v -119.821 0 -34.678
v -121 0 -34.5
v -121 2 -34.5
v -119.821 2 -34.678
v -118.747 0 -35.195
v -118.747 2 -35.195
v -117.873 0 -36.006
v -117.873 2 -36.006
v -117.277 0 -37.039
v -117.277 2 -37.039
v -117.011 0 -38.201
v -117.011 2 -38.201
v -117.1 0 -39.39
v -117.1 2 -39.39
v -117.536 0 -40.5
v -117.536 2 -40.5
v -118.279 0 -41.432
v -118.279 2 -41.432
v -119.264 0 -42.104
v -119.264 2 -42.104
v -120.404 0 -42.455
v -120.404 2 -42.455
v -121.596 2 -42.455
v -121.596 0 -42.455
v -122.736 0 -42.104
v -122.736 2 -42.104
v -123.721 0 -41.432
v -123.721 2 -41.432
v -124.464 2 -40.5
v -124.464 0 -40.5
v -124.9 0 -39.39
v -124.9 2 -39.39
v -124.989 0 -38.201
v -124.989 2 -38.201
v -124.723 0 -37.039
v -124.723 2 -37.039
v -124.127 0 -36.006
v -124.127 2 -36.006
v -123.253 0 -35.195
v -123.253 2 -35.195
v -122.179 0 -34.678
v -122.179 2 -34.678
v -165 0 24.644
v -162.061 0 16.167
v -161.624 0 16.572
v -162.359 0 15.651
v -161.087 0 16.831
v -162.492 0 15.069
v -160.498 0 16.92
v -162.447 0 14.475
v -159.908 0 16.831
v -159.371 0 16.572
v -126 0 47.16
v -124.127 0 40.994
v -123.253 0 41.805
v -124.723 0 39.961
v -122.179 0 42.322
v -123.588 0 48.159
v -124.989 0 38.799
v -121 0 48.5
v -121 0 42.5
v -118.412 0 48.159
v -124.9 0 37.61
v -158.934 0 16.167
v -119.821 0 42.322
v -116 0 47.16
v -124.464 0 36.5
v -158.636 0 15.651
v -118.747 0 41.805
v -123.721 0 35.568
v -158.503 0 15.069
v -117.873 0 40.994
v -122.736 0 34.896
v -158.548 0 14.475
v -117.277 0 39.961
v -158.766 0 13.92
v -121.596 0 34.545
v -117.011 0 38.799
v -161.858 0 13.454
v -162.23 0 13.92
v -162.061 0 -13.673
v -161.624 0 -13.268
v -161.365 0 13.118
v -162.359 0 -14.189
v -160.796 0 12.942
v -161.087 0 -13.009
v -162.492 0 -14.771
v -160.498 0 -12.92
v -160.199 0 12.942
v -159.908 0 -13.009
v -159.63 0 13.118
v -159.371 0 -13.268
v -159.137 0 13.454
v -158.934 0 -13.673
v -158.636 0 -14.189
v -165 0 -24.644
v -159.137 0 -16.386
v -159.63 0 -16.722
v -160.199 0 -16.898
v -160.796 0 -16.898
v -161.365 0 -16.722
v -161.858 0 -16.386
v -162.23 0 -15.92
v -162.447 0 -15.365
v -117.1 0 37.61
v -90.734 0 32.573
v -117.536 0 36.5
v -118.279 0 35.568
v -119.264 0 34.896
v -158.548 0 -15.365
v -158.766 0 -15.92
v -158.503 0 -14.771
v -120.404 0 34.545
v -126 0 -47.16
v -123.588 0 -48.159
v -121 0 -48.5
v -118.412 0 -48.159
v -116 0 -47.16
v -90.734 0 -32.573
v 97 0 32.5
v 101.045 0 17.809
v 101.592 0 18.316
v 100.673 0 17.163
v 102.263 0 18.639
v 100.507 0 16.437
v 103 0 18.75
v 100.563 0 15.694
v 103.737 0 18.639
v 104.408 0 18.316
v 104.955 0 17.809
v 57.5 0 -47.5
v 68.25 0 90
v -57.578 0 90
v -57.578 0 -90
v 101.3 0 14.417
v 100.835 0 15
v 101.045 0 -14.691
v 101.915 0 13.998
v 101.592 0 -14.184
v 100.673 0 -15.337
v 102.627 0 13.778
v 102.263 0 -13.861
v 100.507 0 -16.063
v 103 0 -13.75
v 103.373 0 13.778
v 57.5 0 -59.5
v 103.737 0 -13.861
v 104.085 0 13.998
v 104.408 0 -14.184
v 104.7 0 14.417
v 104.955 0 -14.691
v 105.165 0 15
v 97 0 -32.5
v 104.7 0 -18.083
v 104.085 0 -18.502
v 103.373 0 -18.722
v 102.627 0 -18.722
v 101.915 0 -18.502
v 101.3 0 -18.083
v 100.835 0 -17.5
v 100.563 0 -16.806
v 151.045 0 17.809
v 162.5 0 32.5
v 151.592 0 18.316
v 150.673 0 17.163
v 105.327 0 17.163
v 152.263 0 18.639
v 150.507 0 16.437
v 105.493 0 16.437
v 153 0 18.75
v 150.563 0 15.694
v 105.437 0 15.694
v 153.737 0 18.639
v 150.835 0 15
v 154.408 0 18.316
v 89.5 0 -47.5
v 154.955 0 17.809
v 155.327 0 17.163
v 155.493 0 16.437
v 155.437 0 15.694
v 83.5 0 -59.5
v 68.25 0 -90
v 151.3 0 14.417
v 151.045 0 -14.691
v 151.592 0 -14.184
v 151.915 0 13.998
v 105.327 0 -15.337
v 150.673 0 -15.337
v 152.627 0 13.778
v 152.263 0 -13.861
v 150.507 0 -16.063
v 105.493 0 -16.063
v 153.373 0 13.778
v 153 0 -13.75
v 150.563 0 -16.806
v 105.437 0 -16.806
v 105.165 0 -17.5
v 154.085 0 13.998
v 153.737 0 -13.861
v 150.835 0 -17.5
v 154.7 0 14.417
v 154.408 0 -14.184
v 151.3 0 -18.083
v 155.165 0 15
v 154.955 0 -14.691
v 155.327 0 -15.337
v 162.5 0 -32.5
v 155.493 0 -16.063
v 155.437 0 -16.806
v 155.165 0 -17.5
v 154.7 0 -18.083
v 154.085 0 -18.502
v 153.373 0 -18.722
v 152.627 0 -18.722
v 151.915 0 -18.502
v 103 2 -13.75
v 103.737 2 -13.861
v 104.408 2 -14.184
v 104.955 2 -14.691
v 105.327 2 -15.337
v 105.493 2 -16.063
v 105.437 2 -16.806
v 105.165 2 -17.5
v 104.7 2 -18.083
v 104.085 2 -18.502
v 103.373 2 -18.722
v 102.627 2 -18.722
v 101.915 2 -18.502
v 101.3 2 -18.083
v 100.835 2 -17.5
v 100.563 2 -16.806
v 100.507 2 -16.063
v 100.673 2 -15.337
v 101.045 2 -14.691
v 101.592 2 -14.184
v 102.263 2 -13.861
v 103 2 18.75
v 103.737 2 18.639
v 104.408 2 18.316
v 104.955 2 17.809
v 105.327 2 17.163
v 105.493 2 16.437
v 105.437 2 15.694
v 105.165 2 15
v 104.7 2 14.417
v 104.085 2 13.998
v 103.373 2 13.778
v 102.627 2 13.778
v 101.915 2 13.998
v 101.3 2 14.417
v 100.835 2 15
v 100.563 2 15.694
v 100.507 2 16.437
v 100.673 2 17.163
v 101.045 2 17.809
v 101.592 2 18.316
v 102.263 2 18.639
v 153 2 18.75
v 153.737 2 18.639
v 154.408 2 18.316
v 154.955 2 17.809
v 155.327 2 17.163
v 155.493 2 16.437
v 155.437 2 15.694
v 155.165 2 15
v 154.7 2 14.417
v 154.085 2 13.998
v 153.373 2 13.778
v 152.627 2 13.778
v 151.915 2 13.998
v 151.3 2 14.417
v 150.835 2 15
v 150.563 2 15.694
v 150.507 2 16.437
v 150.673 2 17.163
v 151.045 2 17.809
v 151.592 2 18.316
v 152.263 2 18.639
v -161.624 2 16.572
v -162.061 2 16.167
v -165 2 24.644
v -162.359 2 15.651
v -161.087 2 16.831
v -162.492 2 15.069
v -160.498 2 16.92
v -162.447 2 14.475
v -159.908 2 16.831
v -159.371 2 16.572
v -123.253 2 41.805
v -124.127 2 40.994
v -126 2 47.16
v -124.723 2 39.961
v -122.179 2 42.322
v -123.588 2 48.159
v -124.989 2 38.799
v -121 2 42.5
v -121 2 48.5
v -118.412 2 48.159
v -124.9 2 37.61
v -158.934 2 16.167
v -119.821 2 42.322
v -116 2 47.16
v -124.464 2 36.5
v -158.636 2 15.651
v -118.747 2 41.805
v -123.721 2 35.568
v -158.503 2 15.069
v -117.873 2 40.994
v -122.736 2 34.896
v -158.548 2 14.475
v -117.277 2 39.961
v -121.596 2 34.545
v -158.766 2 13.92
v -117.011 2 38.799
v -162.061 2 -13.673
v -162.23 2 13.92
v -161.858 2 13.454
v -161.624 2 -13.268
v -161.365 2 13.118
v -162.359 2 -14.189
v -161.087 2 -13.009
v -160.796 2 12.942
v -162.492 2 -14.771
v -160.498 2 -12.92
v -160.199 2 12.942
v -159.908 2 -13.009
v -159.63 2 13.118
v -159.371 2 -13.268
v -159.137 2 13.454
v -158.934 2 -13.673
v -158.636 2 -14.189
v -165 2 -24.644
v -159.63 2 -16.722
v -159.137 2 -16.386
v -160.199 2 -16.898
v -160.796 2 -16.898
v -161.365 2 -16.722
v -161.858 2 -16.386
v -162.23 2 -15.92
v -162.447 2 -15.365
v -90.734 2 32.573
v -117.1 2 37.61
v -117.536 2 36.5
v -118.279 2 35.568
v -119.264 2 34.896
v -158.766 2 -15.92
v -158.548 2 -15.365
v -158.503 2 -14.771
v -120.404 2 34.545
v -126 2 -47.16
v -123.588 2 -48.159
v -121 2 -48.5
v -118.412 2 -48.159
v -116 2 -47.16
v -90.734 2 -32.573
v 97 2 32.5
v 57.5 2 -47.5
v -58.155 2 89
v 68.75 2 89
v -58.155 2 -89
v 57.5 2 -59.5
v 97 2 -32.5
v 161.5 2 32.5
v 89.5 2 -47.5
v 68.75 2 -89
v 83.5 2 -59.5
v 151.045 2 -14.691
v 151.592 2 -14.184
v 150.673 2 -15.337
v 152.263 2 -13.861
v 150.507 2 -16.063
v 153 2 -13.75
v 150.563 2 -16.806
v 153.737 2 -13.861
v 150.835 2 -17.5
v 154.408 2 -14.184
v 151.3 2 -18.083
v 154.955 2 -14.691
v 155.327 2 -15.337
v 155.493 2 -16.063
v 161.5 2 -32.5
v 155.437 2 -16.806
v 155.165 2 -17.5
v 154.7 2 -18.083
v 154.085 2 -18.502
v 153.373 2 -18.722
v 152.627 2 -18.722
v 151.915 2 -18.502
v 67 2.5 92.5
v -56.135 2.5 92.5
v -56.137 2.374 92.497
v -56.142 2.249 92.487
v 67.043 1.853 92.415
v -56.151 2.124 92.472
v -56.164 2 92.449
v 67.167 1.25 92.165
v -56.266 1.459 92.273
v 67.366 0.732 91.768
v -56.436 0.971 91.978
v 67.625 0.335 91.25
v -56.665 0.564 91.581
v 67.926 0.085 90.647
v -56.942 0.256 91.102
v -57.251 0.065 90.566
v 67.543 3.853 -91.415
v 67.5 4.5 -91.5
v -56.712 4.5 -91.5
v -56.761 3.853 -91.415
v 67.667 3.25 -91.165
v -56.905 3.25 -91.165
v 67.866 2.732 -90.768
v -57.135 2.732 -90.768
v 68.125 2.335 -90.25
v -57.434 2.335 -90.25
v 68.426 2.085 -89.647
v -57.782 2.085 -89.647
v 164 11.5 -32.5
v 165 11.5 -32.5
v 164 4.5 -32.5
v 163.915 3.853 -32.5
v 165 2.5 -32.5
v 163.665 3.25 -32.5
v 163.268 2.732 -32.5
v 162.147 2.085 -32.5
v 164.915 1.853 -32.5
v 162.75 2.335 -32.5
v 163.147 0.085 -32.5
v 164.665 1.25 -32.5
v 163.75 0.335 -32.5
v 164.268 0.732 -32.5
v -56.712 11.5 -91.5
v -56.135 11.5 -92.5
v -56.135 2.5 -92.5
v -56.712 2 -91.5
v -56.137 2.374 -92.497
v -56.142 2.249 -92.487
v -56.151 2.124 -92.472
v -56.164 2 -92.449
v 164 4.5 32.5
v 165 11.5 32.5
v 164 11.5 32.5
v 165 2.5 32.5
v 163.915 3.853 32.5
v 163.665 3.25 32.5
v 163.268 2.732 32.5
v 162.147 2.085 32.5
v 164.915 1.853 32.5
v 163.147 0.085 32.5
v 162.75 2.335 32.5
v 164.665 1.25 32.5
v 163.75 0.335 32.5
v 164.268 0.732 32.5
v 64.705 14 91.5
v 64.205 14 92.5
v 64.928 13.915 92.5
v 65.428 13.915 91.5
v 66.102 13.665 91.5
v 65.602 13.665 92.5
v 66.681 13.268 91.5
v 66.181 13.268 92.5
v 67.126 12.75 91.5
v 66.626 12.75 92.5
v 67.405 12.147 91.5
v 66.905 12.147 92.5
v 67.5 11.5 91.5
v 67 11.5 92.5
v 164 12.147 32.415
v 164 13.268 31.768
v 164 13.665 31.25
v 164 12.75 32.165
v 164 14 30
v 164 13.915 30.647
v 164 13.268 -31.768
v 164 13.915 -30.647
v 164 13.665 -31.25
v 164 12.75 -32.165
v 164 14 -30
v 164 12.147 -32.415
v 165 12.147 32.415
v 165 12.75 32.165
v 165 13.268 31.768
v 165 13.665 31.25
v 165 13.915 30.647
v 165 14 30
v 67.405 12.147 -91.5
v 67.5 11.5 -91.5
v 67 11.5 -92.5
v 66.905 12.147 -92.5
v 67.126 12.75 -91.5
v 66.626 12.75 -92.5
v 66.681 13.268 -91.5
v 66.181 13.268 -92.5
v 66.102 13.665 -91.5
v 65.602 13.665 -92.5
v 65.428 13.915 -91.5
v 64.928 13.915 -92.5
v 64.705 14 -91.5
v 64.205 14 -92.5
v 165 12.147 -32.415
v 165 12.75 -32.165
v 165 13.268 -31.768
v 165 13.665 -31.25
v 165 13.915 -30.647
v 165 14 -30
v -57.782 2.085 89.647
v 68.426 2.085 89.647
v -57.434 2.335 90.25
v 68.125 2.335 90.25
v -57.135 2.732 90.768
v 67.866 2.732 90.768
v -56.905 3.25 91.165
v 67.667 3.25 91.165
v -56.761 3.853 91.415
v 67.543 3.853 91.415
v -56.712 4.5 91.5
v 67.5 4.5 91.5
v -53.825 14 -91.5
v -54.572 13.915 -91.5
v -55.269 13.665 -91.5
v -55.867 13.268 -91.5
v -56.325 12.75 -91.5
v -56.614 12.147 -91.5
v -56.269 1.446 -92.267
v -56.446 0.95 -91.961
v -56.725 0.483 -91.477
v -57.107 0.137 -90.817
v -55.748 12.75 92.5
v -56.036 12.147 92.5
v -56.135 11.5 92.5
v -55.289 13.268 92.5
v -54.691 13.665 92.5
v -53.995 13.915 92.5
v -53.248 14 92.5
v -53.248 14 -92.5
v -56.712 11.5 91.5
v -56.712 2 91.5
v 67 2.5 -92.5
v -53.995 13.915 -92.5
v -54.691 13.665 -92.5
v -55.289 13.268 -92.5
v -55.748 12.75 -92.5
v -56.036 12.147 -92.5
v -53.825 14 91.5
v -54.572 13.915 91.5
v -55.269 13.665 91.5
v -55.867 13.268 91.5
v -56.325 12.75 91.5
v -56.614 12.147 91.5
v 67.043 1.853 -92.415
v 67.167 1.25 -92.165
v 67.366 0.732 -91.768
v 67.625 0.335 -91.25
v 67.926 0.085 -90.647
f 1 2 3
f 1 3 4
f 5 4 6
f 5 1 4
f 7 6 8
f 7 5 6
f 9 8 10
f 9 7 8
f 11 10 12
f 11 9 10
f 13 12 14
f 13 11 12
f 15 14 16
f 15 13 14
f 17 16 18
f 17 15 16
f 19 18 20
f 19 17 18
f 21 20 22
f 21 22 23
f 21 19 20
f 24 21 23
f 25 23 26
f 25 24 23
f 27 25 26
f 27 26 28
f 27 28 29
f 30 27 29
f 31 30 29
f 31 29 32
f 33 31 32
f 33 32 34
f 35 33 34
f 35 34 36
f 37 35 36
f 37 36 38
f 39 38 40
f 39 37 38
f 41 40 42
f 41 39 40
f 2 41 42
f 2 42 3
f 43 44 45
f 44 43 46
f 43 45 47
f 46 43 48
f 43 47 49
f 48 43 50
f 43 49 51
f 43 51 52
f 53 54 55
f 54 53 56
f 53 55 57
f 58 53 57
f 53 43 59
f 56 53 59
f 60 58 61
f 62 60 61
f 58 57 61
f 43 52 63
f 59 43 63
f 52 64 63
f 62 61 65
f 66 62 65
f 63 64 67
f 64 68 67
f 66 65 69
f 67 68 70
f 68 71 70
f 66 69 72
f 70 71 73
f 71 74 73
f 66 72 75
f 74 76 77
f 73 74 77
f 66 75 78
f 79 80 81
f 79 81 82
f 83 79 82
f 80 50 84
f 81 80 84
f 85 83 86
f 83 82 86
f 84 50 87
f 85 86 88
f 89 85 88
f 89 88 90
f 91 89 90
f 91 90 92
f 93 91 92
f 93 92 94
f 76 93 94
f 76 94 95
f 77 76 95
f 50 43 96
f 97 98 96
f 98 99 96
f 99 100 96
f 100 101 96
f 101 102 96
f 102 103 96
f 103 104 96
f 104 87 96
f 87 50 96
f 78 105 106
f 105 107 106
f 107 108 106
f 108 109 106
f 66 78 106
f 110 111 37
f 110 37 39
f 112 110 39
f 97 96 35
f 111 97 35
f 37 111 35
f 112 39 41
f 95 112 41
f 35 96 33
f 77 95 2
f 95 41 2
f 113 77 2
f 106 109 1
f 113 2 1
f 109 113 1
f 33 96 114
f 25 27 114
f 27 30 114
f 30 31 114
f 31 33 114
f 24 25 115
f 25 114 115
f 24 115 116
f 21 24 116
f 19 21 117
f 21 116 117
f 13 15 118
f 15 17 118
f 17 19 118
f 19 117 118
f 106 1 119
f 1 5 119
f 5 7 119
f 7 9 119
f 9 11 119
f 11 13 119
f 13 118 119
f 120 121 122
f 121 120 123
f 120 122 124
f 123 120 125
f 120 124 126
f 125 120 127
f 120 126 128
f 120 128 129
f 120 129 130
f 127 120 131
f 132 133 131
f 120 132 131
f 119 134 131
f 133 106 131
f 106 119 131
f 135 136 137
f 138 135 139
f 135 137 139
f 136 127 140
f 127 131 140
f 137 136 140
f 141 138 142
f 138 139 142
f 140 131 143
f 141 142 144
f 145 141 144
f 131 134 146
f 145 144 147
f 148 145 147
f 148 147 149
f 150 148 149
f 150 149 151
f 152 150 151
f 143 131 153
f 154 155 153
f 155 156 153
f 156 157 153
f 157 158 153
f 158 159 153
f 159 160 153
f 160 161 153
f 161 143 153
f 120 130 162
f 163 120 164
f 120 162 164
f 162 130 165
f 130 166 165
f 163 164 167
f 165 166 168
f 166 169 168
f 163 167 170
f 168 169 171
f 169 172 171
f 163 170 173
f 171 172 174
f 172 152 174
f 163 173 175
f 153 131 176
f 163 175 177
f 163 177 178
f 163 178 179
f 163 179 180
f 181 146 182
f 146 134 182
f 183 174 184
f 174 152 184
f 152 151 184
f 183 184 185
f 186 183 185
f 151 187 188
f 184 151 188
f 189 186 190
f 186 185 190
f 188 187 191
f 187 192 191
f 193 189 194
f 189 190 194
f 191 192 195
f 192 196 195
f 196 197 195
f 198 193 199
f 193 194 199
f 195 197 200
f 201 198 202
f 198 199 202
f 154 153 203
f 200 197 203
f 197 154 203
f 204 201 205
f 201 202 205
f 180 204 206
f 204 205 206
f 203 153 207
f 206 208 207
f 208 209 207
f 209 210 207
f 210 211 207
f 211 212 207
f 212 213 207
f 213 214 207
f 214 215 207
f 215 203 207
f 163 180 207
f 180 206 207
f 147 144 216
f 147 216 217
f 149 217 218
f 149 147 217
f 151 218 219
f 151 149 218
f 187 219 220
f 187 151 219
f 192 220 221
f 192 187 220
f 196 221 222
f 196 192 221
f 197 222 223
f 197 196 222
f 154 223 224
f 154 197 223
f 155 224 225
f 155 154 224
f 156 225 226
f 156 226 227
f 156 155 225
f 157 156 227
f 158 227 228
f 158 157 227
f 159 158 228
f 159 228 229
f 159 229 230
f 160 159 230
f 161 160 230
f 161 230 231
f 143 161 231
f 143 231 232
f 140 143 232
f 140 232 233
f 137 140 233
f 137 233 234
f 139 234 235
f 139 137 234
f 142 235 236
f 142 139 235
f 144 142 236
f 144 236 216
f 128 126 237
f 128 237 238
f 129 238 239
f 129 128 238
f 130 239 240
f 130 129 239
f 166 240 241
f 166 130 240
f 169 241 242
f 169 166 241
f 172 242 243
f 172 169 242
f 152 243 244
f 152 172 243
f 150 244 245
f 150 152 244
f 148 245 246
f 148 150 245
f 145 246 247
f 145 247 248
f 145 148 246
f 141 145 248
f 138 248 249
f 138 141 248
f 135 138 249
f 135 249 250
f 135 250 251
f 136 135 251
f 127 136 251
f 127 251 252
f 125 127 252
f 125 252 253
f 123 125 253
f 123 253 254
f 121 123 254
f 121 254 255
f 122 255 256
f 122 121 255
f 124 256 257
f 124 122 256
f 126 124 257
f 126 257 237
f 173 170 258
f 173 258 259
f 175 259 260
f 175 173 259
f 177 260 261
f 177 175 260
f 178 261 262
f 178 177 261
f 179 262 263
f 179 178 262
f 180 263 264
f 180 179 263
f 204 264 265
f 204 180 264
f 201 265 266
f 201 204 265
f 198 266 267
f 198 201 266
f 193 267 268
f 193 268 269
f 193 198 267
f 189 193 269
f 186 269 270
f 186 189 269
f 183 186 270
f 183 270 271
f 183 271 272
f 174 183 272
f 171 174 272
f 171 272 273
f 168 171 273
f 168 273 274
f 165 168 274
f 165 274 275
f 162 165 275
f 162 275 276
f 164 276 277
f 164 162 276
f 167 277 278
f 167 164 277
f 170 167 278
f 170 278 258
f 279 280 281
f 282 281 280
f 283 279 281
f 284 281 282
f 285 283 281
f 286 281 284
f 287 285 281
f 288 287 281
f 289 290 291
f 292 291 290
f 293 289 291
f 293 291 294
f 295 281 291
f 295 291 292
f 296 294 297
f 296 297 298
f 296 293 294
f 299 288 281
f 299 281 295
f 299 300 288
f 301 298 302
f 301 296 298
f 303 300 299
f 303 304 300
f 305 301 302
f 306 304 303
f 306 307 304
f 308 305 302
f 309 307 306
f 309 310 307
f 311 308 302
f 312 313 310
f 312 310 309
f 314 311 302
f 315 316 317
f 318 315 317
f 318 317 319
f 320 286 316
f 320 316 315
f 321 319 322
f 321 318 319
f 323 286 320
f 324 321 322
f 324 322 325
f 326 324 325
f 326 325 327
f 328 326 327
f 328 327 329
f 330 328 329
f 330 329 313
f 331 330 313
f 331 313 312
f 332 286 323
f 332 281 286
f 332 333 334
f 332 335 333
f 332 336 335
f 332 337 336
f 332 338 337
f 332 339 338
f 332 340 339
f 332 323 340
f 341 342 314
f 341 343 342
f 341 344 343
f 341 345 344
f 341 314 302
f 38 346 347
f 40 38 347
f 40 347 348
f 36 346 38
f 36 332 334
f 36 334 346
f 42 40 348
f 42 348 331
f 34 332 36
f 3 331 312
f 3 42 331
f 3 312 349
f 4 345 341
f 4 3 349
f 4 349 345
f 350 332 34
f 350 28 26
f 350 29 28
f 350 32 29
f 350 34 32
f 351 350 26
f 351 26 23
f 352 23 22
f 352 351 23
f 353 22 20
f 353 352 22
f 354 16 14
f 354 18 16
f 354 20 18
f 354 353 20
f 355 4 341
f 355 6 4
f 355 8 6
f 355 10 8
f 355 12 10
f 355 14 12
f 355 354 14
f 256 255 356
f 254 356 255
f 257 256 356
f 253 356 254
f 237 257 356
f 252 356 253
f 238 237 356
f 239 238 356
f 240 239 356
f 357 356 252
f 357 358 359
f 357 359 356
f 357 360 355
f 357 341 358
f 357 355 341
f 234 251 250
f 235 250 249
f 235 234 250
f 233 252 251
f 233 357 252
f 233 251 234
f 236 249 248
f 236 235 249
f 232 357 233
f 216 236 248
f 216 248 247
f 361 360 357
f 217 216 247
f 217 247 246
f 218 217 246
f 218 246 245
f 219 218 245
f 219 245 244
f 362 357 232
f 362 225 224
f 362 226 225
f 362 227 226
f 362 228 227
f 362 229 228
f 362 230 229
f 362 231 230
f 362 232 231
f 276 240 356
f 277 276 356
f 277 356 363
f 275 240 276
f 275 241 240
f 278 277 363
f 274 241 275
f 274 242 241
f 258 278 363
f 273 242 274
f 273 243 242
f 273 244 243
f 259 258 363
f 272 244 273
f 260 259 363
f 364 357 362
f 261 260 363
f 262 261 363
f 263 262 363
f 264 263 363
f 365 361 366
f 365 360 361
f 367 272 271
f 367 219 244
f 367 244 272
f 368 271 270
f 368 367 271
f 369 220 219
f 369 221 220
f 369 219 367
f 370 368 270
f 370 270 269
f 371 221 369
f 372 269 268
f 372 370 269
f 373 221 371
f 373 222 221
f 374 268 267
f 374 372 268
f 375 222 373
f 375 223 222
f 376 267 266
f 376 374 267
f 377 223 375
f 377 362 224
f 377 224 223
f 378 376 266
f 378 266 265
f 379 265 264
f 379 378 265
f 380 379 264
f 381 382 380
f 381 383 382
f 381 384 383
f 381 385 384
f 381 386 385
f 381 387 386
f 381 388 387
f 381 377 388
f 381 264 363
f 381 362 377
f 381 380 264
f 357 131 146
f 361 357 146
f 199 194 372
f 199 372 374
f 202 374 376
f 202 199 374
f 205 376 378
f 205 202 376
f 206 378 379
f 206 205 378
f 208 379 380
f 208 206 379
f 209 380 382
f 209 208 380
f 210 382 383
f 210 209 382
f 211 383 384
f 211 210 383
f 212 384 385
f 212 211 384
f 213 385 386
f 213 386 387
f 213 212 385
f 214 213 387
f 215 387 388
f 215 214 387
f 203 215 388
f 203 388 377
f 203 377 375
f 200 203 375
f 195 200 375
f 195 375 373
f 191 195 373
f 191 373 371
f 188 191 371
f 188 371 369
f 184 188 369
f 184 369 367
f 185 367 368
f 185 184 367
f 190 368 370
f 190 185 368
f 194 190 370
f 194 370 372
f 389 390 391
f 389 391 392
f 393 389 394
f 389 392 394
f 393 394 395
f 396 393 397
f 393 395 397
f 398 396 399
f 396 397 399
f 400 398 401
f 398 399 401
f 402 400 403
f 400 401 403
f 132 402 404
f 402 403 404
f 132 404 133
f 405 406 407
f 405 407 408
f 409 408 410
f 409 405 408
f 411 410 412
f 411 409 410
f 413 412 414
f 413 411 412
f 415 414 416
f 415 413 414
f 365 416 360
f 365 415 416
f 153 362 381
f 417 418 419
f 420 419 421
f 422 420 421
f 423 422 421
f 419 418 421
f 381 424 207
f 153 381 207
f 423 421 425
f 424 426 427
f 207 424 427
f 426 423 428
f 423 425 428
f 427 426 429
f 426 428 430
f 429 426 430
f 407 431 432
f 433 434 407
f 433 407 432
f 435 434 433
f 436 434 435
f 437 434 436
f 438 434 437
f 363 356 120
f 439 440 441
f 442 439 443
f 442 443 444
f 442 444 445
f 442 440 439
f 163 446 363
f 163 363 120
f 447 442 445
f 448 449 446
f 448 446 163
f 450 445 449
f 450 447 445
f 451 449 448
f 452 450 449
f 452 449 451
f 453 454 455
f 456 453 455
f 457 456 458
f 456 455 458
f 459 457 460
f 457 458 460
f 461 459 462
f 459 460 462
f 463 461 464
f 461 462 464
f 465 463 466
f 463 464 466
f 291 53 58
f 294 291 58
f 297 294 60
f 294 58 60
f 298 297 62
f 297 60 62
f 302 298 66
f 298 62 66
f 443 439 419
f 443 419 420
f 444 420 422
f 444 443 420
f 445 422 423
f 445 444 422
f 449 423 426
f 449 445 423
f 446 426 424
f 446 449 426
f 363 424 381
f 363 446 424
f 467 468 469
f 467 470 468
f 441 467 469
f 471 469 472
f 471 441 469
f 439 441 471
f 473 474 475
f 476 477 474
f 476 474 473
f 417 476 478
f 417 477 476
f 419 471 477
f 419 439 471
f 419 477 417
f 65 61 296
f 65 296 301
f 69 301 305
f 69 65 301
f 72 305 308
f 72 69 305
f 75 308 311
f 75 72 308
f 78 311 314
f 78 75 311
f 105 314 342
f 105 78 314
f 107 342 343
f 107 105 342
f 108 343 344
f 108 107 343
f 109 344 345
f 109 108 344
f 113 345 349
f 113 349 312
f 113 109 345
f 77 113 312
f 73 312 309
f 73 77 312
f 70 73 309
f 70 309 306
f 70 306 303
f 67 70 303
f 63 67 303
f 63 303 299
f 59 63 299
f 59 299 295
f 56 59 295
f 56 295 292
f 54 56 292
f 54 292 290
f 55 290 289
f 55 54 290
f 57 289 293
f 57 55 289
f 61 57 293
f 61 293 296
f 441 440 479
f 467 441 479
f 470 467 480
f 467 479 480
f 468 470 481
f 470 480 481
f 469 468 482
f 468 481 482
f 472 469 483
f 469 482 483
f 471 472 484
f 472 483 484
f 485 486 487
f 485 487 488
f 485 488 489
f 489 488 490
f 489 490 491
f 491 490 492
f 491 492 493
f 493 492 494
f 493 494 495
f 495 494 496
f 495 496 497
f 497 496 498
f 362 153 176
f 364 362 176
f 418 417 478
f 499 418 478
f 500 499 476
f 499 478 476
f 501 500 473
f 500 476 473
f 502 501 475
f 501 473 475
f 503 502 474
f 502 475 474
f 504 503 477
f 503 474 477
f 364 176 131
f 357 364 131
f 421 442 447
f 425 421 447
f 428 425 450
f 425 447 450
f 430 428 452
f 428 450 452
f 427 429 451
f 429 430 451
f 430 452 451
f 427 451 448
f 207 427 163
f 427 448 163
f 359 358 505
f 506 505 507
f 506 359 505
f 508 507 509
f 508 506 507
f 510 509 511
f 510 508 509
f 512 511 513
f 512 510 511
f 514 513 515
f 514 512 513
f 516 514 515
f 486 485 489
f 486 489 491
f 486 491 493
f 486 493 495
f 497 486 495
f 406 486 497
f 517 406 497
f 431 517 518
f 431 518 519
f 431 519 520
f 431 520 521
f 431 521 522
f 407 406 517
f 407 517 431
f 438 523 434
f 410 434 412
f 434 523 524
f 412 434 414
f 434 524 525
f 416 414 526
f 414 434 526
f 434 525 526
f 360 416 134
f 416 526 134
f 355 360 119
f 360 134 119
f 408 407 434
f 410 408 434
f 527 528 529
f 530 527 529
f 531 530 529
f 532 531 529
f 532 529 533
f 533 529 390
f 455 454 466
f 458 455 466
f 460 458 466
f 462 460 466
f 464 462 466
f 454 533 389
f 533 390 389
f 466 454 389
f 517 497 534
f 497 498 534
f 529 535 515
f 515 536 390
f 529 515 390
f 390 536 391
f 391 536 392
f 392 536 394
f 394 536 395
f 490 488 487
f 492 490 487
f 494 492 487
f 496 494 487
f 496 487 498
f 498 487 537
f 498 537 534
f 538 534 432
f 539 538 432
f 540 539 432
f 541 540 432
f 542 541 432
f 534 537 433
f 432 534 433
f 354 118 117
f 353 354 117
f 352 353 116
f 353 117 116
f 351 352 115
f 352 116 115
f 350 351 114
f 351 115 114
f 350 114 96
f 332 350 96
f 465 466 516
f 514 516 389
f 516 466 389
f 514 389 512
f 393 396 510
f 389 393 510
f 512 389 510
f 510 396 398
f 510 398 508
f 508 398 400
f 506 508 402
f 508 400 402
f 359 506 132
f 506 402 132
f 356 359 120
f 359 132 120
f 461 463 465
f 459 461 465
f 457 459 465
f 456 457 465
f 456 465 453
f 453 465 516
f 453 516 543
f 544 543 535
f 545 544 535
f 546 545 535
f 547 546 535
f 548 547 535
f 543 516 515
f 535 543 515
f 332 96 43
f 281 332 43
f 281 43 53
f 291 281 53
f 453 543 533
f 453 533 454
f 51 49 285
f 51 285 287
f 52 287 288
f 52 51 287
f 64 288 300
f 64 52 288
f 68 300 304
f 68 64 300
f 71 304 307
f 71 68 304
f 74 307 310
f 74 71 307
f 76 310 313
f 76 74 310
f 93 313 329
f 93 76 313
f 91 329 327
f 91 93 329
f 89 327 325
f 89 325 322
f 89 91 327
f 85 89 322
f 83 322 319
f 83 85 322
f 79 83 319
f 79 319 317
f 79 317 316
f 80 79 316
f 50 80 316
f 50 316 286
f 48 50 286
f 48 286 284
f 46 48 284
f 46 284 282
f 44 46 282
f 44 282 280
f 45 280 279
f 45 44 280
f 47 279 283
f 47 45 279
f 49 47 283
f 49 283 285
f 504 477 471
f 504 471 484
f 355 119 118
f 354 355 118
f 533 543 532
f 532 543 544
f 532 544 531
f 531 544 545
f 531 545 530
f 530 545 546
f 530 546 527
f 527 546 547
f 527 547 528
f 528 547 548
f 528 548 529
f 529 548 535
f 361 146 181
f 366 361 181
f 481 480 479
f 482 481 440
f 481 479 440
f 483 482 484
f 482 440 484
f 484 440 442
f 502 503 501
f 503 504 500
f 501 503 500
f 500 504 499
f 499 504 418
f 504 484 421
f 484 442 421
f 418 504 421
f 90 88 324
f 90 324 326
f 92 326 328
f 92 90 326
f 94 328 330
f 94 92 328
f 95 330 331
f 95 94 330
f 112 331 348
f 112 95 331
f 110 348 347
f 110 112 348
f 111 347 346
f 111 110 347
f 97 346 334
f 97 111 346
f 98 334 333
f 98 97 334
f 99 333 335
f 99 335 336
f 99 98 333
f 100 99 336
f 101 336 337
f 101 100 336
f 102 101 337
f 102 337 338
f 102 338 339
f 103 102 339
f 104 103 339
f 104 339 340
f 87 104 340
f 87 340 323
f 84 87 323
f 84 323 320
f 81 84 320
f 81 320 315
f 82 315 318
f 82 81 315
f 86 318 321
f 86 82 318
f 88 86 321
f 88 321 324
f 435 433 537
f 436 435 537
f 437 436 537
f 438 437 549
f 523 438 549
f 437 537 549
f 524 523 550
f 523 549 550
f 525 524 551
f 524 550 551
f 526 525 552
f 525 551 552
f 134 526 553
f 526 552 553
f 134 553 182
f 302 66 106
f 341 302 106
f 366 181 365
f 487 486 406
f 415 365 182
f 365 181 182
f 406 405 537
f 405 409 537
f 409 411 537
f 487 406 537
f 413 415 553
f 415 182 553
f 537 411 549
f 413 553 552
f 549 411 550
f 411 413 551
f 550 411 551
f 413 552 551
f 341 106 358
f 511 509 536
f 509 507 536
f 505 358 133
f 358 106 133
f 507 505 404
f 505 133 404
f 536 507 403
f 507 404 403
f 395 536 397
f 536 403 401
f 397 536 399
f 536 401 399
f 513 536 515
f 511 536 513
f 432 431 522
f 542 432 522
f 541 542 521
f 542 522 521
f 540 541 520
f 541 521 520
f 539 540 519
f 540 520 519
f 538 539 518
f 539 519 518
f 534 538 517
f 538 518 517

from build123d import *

# Parameters (mm, degrees)
SKETCH1_R           = 4
SKETCH1_R_2         = 2
SKETCH1_R_3         = 2.5
BOSS_EXTRUDE1_DEPTH = 2
SKETCH2_W           = 1
SKETCH2_H           = 65
BOSS_EXTRUDE2_DEPTH = 12
FILLET1_R           = 2.5


with BuildPart() as part:
    # Sketch1 → Boss-Extrude1 (new body)
    with BuildSketch(Plane(origin=(0, 0, 0), x_dir=(1, 0, 0), z_dir=(0, 1, 0))):
        with BuildLine():
            Line((165, -32.5), (165, 32.5))
            Line((165, 32.5), (97, 32.5))
            Line((97, 32.5), (89.5, 47.5))
            Line((89.5, 47.5), (57.5, 47.5))
            Line((57.5, 47.5), (57.5, 59.5))
            Line((57.5, 59.5), (83.5, 59.5))
            Line((83.5, 59.5), (67, 92.5))
            Line((67, 92.5), (-56.134697257, 92.5))
            Line((-56.134697257, 92.5), (-90.733708845, 32.572754038))
            Line((-90.733708845, 32.572754038), (-116, 47.160254038))
            ThreePointArc((-116, 47.160254038), (-121, 48.5), (-126, 47.160254038))
            Line((-126, 47.160254038), (-165, 24.643593539))
            Line((-165, 24.643593539), (-165, -24.643593539))
            Line((-165, -24.643593539), (-126, -47.160254038))
            ThreePointArc((-126, -47.160254038), (-121, -48.5), (-116, -47.160254038))
            Line((-116, -47.160254038), (-90.733708845, -32.572754038))
            Line((-90.733708845, -32.572754038), (-56.134697257, -92.5))
            Line((-56.134697257, -92.5), (67, -92.5))
            Line((67, -92.5), (97, -32.5))
            Line((97, -32.5), (165, -32.5))
        make_face()
        with Locations(Location((-121, -38.5, 0), (0, 0, 270))):
            Circle(SKETCH1_R, mode=Mode.SUBTRACT)
        with Locations(Location((-160.497563939, -14.92, 0), (0, 0, 270))):
            Circle(SKETCH1_R_2, mode=Mode.SUBTRACT)
        with Locations(Location((103, -16.25, 0), (0, 0, 270))):
            Circle(SKETCH1_R_3, mode=Mode.SUBTRACT)
        with Locations(Location((153, -16.25, 0), (0, 0, 270))):
            Circle(SKETCH1_R_3, mode=Mode.SUBTRACT)
        with Locations(Location((-160.497578586, 14.92, 0), (0, 0, 270))):
            Circle(SKETCH1_R_2, mode=Mode.SUBTRACT)
        with Locations(Location((-121, 38.5, 0), (0, 0, 270))):
            Circle(SKETCH1_R, mode=Mode.SUBTRACT)
        with Locations(Location((103, 16.25, 0), (0, 0, 270))):
            Circle(SKETCH1_R_3, mode=Mode.SUBTRACT)
        with Locations(Location((153, 16.25, 0), (0, 0, 270))):
            Circle(SKETCH1_R_3, mode=Mode.SUBTRACT)
    extrude(amount=BOSS_EXTRUDE1_DEPTH)

    # Sketch2 → Boss-Extrude2 (add)
    with BuildSketch(Plane(origin=(0, 2, 0), x_dir=(1, 0, 0), z_dir=(0, 1, 0))):
        Polygon((-56.134697257, -92.5), (67, -92.5), (67.5, -91.5), (-56.712047526, -91.5), align=None)
        Polygon((-56.134697257, 92.5), (67, 92.5), (67.5, 91.5), (-56.712047526, 91.5), align=None)
        with Locations((164.5, 0)):
            Rectangle(SKETCH2_W, SKETCH2_H)
    extrude(amount=BOSS_EXTRUDE2_DEPTH)

    # Fillet1
    # the kernel refuses this fillet: 2.5 mm, written as the material it adds along each edge
    with BuildSketch(Plane(origin=(73.75, 2, -91.5), x_dir=(0, 1, 0), z_dir=(-1, 0, 0))) as fillet1_piece_1_section:
        with BuildLine():
            CenterArc((FILLET1_R, -FILLET1_R), FILLET1_R, 90, 90)
            Line((0, -FILLET1_R), (0, 0))
            Line((0, 0), (FILLET1_R, 0))
        make_face()
    fillet1_piece_1 = extrude(amount=136.712047526, mode=Mode.PRIVATE)
    fillet1_piece_1 = split(fillet1_piece_1, bisect_by=Plane(origin=(-41.43720377, 2.56450665, -117.956805463), z_dir=(0.8660254037844399, 0, 0.49999999999999795)), keep=Keep.TOP, mode=Mode.PRIVATE)
    fillet1_piece_1 = split(fillet1_piece_1, bisect_by=Plane(origin=(55.3017959, 2.56450665, -115.8964082), z_dir=(-0.894427190999916, 0, 0.447213595499958)), keep=Keep.TOP, mode=Mode.PRIVATE)
    add(fillet1_piece_1)
    with BuildSketch(Plane(origin=(164, 2, 32.5), x_dir=(0, 1, 0), z_dir=(0, 0, -1))) as fillet1_piece_2:
        with BuildLine():
            CenterArc((FILLET1_R, -FILLET1_R), FILLET1_R, 90, 90)
            Line((0, -FILLET1_R), (0, 0))
            Line((0, 0), (FILLET1_R, 0))
        make_face()
    extrude(amount=65)
    with BuildSketch(Plane(origin=(73.75, 2, 91.5), x_dir=(0, 0, -1), z_dir=(-1, 0, 0))) as fillet1_piece_3_section:
        with BuildLine():
            CenterArc((FILLET1_R, -FILLET1_R), FILLET1_R, 90, 90)
            Line((0, -FILLET1_R), (0, 0))
            Line((0, 0), (FILLET1_R, 0))
        make_face()
    fillet1_piece_3 = extrude(amount=136.712047526, mode=Mode.PRIVATE)
    fillet1_piece_3 = split(fillet1_piece_3, bisect_by=Plane(origin=(55.3017959, 2.56450665, 115.8964082), z_dir=(-0.894427190999916, 0, -0.44721359549995787)), keep=Keep.TOP, mode=Mode.PRIVATE)
    fillet1_piece_3 = split(fillet1_piece_3, bisect_by=Plane(origin=(-41.43720377, 2.56450665, 117.956805463), z_dir=(0.8660254037844399, 0, -0.49999999999999795)), keep=Keep.TOP, mode=Mode.PRIVATE)
    add(fillet1_piece_3)
    # the kernel refuses this fillet: 2.5 mm, written as the material it takes off along each edge
    with BuildSketch(Plane(origin=(-59.837047526, 14, -86.087341226), x_dir=(0, -1, 0), z_dir=(0.5000000000000019, 0, -0.8660254037844376)), Plane(origin=(-59.837047526, 14, 86.087341226), x_dir=(0.8660254037844394, 0, -0.49999999999999867), z_dir=(0.4999999999999987, 0, 0.8660254037844395))) as fillet1_2_piece_1:
        with BuildLine():
            CenterArc((FILLET1_R, -FILLET1_R), FILLET1_R, 90, 90)
            Line((0, -FILLET1_R), (0, 0))
            Line((0, 0), (FILLET1_R, 0))
        make_face()
    extrude(amount=13.654700538, mode=Mode.SUBTRACT)
    with BuildSketch(Plane(origin=(64.204915028, 14, -98.090169944), x_dir=(0, -1, 0), z_dir=(0.447213595499958, 0, 0.894427190999916))) as fillet1_2_piece_2:
        with BuildLine():
            CenterArc((FILLET1_R, -FILLET1_R), FILLET1_R, 90, 90)
            Line((0, -FILLET1_R), (0, 0))
            Line((0, 0), (FILLET1_R, 0))
        make_face()
    extrude(amount=13.618033989, mode=Mode.SUBTRACT)
    with BuildSketch(Plane(origin=(157.75, 14, -32.5), x_dir=(0, -1, 0), z_dir=(1, 0, 0)), Plane(origin=(171.25, 14, 32.5), x_dir=(0, -1, 0), z_dir=(-1, 0, 0))) as fillet1_2_piece_3:
        with BuildLine():
            CenterArc((FILLET1_R, -FILLET1_R), FILLET1_R, 90, 90)
            Line((0, -FILLET1_R), (0, 0))
            Line((0, 0), (FILLET1_R, 0))
        make_face()
    extrude(amount=13.5, mode=Mode.SUBTRACT)
    with BuildSketch(Plane(origin=(73.25, 0, -92.5), x_dir=(0, 0, 1), z_dir=(-1, 0, 0))) as fillet1_2_piece_4:
        with BuildLine():
            CenterArc((FILLET1_R, FILLET1_R), FILLET1_R, 180, 90)
            Line((0, FILLET1_R), (0, 0))
            Line((0, 0), (FILLET1_R, 0))
        make_face()
    extrude(amount=135.634697257, mode=Mode.SUBTRACT)
    with BuildSketch(Plane(origin=(165, 0, 38.75), x_dir=(-1, 0, 0), z_dir=(0, 0, -1))) as fillet1_2_piece_5:
        with BuildLine():
            CenterArc((FILLET1_R, FILLET1_R), FILLET1_R, 180, 90)
            Line((0, FILLET1_R), (0, 0))
            Line((0, 0), (FILLET1_R, 0))
        make_face()
    extrude(amount=77.5, mode=Mode.SUBTRACT)
    with BuildSketch(Plane(origin=(-62.384697257, 0, 92.5), x_dir=(0, 1, 0), z_dir=(1, 0, 0))) as fillet1_2_piece_6:
        with BuildLine():
            CenterArc((FILLET1_R, -FILLET1_R), FILLET1_R, 90, 90)
            Line((0, -FILLET1_R), (0, 0))
            Line((0, 0), (FILLET1_R, 0))
        make_face()
    extrude(amount=135.634697257, mode=Mode.SUBTRACT)
    with BuildSketch(Plane(origin=(64.204915028, 14, 98.090169944), x_dir=(0, -1, 0), z_dir=(0.447213595499958, 0, -0.894427190999916))) as fillet1_2_piece_7:
        with BuildLine():
            CenterArc((FILLET1_R, FILLET1_R), FILLET1_R, 180, 90)
            Line((0, FILLET1_R), (0, 0))
            Line((0, 0), (FILLET1_R, 0))
        make_face()
    extrude(amount=13.618033989, mode=Mode.SUBTRACT)


solid = part.part
